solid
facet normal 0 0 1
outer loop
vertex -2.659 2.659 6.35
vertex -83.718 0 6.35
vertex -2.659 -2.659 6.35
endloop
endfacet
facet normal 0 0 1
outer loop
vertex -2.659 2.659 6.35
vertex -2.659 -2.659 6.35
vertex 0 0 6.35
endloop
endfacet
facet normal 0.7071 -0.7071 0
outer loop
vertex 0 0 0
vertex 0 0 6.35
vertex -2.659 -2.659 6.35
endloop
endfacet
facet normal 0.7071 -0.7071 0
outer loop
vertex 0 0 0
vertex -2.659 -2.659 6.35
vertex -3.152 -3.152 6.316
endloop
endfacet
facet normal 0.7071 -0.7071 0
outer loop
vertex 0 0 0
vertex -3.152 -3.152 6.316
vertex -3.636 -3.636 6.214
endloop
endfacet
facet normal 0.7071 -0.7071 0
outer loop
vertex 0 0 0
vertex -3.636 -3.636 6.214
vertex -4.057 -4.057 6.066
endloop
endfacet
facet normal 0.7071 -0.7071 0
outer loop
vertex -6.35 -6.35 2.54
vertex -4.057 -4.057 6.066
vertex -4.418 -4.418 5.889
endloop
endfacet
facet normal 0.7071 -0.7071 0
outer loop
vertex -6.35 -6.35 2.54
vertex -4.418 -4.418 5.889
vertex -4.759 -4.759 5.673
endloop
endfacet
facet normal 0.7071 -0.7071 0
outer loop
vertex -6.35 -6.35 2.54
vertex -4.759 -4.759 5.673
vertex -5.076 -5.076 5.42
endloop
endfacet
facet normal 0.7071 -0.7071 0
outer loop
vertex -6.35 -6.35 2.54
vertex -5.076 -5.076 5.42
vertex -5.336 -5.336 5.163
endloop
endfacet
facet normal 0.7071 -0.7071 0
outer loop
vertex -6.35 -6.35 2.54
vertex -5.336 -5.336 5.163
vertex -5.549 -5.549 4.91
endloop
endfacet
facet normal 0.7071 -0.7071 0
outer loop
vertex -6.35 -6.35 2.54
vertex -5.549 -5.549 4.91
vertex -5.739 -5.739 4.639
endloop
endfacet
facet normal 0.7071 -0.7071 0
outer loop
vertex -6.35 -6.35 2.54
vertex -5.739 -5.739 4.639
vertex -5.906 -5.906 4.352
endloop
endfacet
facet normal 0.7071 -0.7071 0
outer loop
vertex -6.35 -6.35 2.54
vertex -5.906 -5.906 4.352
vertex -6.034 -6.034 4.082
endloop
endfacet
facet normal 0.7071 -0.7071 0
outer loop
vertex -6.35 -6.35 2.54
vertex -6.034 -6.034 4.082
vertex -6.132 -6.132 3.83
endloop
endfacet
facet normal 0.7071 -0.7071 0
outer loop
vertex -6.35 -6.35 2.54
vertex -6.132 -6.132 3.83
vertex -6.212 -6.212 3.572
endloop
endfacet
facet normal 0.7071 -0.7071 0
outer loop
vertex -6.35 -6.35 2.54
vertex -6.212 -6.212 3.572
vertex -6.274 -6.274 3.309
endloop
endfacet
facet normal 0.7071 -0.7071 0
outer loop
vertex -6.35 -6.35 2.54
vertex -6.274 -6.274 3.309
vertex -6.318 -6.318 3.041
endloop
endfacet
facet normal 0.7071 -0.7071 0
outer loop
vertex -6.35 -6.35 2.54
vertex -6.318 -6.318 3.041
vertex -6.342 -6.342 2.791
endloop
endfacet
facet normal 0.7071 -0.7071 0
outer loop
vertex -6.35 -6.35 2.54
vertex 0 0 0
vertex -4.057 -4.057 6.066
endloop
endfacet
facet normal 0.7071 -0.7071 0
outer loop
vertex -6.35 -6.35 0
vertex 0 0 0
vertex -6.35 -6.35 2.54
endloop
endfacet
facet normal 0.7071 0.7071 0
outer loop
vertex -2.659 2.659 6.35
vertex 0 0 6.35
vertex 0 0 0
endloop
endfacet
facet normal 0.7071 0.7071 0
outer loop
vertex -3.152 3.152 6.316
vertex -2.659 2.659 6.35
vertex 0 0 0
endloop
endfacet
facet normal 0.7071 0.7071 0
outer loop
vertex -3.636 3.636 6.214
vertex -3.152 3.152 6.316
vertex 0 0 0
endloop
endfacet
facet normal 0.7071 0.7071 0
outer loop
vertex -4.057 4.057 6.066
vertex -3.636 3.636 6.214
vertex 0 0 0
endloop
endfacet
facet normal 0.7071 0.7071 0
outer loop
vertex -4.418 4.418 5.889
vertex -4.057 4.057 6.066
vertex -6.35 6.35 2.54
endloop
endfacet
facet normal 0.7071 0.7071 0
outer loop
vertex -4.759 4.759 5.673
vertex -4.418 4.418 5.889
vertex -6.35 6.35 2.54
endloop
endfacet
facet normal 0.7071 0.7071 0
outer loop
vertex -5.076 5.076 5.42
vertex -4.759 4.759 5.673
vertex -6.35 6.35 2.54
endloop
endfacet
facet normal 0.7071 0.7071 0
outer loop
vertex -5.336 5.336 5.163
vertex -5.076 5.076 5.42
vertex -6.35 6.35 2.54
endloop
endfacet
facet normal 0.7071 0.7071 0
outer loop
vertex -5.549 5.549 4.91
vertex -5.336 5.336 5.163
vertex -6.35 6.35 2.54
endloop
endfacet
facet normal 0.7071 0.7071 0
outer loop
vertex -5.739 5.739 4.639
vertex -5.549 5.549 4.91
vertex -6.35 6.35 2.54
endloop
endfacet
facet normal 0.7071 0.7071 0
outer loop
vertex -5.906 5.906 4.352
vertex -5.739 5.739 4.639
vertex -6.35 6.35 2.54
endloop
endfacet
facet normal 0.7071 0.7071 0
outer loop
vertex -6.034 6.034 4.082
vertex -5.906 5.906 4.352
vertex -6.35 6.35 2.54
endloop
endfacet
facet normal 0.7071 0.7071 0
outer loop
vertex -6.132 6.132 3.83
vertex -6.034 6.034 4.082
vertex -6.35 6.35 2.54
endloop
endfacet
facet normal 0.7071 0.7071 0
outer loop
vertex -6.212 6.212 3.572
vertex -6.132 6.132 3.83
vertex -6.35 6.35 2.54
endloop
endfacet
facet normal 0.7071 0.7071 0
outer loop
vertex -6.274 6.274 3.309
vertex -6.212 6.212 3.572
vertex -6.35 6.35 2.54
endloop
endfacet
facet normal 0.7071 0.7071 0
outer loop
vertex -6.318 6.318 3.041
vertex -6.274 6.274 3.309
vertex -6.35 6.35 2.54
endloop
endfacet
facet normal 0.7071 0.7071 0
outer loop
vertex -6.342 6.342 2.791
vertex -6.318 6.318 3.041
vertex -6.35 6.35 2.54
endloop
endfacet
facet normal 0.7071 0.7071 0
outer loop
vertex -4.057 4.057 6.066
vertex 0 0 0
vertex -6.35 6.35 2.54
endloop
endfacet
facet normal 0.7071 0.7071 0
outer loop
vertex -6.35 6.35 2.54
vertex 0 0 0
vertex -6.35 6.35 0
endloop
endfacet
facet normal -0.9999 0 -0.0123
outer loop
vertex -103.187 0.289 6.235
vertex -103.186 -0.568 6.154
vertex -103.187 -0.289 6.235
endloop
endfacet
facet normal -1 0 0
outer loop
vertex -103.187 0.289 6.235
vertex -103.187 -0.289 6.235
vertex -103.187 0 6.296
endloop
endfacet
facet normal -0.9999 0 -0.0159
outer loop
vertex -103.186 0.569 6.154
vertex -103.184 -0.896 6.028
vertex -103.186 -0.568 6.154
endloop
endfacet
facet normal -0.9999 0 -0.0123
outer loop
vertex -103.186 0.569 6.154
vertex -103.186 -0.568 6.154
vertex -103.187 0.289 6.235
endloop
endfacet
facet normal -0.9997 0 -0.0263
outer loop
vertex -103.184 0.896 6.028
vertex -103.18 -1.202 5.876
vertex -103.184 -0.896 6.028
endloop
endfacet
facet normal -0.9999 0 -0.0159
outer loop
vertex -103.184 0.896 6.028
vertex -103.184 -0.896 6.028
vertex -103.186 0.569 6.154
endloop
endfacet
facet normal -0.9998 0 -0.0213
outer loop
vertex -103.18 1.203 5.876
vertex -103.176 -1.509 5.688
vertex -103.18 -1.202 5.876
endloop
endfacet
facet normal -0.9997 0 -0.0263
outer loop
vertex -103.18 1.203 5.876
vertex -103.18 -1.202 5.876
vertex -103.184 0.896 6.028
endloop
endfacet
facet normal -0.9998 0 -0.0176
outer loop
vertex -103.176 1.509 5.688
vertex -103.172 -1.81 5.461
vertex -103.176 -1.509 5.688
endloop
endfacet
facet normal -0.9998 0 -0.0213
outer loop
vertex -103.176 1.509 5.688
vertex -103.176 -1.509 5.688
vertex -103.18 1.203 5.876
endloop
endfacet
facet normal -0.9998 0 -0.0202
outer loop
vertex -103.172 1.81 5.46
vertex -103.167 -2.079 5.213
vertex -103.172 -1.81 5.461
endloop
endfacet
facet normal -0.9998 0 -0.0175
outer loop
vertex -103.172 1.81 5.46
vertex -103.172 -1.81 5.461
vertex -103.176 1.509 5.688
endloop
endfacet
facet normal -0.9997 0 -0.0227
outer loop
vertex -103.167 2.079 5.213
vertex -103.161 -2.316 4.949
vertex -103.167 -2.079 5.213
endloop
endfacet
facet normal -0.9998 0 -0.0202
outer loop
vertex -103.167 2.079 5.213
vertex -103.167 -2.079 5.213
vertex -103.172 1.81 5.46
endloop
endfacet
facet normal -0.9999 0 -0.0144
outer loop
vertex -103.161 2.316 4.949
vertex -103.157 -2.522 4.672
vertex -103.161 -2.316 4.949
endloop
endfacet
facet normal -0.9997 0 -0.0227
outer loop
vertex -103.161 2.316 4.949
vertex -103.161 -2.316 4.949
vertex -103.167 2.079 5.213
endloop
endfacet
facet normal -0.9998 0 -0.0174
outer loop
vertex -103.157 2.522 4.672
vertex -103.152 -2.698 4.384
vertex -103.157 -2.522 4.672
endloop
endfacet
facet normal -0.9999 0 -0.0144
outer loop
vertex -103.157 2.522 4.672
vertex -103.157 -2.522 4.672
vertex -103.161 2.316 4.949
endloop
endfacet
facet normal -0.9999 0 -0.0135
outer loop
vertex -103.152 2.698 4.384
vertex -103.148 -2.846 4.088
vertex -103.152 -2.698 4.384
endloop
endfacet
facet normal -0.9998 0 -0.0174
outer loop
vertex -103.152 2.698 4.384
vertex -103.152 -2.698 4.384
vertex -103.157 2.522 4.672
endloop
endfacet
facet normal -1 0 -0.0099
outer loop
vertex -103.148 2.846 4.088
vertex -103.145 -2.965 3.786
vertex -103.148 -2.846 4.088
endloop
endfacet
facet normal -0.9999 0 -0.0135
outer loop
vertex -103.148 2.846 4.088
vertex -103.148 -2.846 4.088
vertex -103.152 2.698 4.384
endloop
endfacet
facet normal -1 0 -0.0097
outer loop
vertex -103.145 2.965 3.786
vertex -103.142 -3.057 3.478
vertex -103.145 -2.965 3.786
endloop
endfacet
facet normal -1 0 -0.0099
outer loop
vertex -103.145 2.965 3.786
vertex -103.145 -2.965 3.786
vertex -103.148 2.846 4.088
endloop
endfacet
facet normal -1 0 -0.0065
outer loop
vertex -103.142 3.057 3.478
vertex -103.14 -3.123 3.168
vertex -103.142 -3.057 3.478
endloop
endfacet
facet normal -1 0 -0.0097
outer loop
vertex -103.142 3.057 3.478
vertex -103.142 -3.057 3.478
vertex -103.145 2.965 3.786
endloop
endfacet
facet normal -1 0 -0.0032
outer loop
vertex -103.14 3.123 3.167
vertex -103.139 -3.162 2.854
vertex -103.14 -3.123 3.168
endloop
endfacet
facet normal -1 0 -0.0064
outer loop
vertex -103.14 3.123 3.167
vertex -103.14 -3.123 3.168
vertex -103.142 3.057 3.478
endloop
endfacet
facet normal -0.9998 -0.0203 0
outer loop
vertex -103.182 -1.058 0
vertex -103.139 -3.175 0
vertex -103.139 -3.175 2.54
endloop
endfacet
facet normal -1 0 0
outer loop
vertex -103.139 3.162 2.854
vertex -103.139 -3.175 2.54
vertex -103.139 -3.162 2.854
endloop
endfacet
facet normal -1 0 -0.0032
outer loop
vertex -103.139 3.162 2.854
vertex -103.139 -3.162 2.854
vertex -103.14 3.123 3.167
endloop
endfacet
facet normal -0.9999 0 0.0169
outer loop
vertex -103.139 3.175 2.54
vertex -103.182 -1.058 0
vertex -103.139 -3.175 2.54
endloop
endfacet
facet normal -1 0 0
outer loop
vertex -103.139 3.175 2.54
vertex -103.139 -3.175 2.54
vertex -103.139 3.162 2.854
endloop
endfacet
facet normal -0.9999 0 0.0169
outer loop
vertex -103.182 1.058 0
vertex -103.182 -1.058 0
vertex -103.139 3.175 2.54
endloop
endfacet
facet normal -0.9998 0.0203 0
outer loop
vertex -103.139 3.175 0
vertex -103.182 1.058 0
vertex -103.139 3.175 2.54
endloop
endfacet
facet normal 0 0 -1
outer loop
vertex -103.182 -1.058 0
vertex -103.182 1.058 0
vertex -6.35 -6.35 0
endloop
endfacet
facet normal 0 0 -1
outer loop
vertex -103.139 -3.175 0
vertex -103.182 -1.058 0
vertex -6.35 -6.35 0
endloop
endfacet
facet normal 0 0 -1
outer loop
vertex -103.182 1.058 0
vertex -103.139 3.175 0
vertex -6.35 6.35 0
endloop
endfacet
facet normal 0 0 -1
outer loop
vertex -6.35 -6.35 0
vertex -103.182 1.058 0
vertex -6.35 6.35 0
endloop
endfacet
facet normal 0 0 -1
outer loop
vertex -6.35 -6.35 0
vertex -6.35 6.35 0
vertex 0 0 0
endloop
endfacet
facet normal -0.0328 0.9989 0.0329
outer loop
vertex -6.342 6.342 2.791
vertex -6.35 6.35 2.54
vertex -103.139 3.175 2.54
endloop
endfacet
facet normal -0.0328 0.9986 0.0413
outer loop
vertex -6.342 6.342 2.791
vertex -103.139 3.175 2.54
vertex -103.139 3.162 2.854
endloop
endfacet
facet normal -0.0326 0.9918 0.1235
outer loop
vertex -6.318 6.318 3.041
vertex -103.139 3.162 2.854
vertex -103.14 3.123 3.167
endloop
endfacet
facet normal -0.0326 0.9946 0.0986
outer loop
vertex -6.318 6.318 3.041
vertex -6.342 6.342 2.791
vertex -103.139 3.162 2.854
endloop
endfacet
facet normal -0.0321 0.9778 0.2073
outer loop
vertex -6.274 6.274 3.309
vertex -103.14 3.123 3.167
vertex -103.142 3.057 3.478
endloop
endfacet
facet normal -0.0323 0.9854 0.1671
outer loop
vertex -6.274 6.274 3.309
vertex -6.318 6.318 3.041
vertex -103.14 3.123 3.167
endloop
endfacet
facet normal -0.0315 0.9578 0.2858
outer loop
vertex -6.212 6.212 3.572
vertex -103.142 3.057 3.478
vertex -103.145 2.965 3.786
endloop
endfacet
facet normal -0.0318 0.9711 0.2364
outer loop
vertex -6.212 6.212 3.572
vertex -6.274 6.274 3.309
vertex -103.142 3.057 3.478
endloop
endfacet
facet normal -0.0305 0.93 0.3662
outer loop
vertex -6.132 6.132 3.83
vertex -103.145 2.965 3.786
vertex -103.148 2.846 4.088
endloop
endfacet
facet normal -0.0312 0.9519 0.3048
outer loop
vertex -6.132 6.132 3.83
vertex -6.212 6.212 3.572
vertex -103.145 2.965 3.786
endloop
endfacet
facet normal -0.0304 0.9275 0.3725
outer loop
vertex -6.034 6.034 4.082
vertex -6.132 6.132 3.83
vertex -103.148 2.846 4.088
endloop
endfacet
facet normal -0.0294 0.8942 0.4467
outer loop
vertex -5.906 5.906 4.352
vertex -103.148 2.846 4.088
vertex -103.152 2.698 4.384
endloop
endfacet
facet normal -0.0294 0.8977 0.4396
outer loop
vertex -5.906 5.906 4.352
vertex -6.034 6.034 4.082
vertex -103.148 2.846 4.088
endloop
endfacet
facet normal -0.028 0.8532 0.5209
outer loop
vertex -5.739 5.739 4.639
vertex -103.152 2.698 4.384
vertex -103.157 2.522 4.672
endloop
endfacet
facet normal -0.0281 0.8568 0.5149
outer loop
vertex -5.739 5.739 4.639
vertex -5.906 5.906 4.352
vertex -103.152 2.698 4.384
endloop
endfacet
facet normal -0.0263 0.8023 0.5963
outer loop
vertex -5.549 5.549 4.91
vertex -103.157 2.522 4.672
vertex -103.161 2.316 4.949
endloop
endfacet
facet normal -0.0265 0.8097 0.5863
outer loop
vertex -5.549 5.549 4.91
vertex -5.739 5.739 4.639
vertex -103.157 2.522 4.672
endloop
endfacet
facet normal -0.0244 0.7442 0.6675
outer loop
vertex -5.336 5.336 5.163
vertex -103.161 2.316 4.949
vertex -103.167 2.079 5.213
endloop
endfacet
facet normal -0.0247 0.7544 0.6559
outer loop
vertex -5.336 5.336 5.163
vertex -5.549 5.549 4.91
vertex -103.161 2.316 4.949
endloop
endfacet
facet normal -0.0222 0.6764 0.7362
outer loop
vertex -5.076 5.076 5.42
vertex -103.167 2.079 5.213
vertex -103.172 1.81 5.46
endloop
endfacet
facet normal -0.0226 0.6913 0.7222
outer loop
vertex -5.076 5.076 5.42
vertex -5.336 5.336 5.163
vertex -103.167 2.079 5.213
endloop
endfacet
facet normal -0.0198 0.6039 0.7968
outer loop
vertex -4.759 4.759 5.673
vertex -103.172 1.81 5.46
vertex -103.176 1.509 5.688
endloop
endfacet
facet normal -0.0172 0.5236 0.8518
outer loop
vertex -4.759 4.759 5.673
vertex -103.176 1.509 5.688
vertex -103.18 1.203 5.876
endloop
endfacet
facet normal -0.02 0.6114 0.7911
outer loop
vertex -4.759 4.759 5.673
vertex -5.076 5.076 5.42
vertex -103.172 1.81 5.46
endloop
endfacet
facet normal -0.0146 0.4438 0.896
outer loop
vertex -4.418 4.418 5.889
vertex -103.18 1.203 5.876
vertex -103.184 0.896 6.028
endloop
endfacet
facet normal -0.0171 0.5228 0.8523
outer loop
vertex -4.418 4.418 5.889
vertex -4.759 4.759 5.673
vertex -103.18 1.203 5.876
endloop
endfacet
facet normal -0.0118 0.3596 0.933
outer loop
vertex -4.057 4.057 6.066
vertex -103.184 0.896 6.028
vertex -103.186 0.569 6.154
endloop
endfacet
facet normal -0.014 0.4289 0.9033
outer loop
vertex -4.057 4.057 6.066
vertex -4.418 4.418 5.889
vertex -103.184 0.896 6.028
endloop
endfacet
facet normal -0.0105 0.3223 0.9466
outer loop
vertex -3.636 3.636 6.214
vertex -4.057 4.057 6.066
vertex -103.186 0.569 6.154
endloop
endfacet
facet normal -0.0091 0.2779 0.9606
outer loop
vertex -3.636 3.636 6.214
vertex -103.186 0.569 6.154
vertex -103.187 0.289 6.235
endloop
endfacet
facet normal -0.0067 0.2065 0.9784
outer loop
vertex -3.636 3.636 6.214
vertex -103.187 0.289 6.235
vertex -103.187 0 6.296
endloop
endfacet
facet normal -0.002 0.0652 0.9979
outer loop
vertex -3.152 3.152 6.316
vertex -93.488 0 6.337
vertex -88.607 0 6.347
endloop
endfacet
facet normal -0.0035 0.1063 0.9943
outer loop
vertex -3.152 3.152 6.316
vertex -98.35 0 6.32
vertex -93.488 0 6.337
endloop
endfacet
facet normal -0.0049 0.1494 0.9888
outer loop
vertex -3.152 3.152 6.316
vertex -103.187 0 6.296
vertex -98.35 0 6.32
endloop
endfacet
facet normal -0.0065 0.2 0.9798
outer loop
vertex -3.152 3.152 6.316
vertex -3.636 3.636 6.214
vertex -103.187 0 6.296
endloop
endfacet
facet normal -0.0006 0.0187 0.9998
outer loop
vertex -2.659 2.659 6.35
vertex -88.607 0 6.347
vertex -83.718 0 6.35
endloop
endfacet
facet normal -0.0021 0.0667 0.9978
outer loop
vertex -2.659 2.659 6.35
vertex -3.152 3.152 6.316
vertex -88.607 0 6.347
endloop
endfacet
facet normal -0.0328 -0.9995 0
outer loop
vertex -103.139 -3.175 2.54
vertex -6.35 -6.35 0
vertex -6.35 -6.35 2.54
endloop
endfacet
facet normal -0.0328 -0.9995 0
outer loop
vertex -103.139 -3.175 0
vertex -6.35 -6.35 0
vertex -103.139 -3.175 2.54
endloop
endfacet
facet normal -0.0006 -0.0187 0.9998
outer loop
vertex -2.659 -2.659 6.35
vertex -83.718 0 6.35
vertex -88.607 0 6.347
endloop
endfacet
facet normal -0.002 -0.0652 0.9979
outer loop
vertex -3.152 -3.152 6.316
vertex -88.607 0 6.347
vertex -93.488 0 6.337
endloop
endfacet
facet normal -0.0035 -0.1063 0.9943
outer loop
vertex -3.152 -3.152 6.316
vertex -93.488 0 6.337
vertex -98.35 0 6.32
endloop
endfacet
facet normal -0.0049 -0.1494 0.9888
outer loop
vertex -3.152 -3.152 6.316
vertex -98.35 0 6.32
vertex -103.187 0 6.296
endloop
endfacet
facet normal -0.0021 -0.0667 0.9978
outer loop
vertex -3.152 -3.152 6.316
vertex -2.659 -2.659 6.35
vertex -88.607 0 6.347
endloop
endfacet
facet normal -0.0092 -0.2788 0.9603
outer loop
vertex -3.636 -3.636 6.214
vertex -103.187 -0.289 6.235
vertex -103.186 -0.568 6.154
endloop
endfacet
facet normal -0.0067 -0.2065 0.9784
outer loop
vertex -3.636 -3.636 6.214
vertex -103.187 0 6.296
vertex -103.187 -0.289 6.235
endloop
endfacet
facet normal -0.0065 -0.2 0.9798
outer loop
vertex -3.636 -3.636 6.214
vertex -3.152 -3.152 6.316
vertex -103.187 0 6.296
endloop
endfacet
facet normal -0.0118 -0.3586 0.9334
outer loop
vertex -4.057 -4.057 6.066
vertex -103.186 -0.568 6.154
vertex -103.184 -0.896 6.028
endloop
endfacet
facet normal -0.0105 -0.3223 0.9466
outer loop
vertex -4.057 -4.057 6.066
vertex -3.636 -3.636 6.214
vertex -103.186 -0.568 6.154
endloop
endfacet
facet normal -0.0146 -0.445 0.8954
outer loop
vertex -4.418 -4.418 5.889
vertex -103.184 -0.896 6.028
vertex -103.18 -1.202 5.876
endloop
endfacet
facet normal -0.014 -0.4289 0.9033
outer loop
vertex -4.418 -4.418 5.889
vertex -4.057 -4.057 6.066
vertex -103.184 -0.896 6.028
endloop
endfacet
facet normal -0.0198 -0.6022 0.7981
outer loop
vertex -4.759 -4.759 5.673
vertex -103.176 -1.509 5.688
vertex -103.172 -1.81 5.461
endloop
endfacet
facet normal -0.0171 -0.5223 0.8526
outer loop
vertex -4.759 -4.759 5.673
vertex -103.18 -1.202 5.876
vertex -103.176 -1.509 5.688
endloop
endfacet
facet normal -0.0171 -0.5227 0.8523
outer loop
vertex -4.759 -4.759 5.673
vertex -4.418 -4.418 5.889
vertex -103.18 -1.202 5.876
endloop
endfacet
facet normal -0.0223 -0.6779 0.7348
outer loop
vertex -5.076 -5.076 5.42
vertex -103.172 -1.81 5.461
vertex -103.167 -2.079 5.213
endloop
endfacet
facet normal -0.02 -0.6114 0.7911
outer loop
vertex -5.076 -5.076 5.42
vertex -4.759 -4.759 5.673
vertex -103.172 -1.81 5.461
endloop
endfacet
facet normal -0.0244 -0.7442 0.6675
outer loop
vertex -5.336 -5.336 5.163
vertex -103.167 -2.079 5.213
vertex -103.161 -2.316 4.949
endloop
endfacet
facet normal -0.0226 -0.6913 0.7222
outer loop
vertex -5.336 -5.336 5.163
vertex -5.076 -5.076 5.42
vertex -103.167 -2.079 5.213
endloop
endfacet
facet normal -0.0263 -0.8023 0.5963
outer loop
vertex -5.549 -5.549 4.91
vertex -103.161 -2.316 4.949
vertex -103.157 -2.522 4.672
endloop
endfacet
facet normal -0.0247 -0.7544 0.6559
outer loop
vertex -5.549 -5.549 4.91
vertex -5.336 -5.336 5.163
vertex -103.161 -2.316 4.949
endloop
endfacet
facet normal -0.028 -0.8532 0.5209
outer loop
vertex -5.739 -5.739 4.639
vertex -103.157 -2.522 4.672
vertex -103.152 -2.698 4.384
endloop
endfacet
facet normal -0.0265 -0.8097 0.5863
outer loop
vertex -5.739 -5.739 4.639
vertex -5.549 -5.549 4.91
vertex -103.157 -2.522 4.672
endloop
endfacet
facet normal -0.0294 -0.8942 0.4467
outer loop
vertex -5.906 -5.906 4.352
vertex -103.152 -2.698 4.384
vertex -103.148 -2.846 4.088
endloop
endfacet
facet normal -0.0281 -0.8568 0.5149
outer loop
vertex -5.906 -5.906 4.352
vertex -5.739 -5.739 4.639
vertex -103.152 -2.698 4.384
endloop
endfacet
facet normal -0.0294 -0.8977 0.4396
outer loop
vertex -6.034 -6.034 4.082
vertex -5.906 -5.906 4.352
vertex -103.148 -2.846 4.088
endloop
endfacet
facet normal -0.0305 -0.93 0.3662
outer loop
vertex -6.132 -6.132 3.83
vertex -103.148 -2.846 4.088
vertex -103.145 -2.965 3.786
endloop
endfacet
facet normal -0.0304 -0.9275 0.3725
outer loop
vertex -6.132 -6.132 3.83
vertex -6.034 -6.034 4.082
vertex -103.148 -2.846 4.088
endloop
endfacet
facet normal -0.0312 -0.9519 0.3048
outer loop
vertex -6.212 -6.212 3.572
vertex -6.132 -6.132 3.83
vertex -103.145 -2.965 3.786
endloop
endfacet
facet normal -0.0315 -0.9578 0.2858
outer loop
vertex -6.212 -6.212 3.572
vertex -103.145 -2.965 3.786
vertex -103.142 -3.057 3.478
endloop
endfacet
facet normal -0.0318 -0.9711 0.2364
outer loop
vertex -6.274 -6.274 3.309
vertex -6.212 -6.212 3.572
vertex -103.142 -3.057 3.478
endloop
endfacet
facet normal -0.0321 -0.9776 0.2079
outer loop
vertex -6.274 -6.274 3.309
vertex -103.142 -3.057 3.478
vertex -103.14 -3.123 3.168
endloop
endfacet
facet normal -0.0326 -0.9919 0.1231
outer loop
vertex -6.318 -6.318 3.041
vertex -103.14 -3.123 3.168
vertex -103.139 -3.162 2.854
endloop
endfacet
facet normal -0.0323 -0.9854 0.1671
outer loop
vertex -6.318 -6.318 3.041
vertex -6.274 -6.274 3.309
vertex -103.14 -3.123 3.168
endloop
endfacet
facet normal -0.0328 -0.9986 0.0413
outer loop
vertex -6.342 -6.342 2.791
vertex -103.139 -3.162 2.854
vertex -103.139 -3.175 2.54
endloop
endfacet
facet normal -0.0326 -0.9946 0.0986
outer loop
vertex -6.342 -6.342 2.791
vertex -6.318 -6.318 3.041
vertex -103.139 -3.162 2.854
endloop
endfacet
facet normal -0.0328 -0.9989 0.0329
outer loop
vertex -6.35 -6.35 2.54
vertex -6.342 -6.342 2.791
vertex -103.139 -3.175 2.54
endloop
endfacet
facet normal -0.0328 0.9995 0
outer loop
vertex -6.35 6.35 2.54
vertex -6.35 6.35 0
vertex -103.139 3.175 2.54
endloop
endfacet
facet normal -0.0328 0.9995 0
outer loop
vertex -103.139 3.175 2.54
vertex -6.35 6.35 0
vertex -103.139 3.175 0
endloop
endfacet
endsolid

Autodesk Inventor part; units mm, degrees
ref_plane "YZ Plane" through (0, 0, 0) normal (1, 0, 0) x (0, 1, 0)
ref_plane "XZ Plane" through (0, 0, 0) normal (0, 1, 0) x (-1, 0, 0)
ref_plane "XY Plane" through (0, 0, 0) normal (0, 0, 1) x (1, 0, 0)
sketch "Sketch1" plane through (0, 0, 0) normal (0, 0, 1) x (1, 0, 0)
  line L0 (0, 0) -> (-6.35, 6.35)
  line L1 (-6.35, 6.35) -> (-103.1386, 3.175)
  line L2 (0, 0) -> (-6.35, -6.35)
  line L3 (-6.35, -6.35) -> (-103.1386, -3.175)
  arc A0 (-103.1386, 3.175) -> (-103.1386, -3.175) centre (0, 0) ccw
  line L4 (0, 0) -> (24.3963, 0) construction
  dimension "d0" = 103.1875
  dimension "d1" = 6.35
  dimension "d2" = 6.35
  dimension "d8" = 135
extrude "Extrusion1" add sketch "Sketch1" along normal blind 6.35
fillet "Fillet1" radius 3.81 2 edges at (-54.7443, -4.7625, 6.35) (-54.7443, 4.7625, 6.35)
properties part number "Lift_Support"
